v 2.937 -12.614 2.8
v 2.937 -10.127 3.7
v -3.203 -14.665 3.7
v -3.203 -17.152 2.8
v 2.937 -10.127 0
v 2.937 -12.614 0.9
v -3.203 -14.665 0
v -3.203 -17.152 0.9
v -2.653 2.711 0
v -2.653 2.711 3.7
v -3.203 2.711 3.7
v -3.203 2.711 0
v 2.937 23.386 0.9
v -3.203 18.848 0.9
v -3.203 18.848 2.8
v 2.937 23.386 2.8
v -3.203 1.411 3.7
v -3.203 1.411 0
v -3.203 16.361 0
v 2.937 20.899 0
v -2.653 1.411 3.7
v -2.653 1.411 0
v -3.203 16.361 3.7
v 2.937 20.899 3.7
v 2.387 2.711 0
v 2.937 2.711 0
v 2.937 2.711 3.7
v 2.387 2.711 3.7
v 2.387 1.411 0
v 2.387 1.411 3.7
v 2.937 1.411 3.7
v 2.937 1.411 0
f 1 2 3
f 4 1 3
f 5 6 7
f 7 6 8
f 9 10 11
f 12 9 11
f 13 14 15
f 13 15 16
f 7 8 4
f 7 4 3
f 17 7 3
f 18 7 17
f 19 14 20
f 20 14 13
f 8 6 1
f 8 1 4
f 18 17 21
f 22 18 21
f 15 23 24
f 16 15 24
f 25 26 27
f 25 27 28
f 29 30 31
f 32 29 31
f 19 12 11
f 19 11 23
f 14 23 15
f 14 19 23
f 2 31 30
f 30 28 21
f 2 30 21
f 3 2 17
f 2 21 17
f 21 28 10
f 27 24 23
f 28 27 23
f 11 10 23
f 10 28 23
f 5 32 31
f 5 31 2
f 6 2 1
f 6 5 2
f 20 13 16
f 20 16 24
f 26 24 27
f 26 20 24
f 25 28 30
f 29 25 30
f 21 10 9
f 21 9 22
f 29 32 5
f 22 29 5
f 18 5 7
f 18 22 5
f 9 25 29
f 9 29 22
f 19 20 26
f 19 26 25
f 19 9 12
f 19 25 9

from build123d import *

# Parameters (mm, degrees)
BOSS_EXTRUDE1_DEPTH     = 3.7
CHAMFER1_SIZE           = 0.9
CHAMFER1_SIZE2          = 2
CHAMFER2_SIZE           = 2
CHAMFER2_SIZE2          = 0.9
CHAMFER4_SIZE           = 0.9
CHAMFER4_SIZE2          = 2
CHAMFER5_SIZE           = 2
CHAMFER5_SIZE2          = 0.9
CUT_EXTRUDE2_DEPTH      = 1
CUT_EXTRUDE2_DEPTH_BACK = 4.7
CUT_EXTRUDE4_DEPTH      = 1
CUT_EXTRUDE4_DEPTH_BACK = 4.7


with BuildPart() as part:
    # Sketch1 → Boss-Extrude1 (new body)
    with BuildSketch(Plane.XY):
        Polygon((2.936521739, 23.386304348), (2.936521739, -12.613695652), (-3.203478261, -17.151956522), (-3.203478261, 18.848043478), align=None)
    extrude(amount=BOSS_EXTRUDE1_DEPTH)

    # Chamfer1
    chamfer1_edges = [part.edges().sort_by_distance(p)[0] for p in [
        (-0.133478261, 21.117173913, 3.7),
    ]]
    chamfer1_side = [part.faces().sort_by_distance(p)[0] for p in [
        (-0.133478261, 21.117173913, 1.85),
    ]]
    chamfer(chamfer1_edges, length=CHAMFER1_SIZE, length2=CHAMFER1_SIZE2, reference=chamfer1_side[0])

    # Chamfer2
    chamfer2_edges = [part.edges().sort_by_distance(p)[0] for p in [
        (-0.133478261, 21.117173913, 0),
    ]]
    chamfer2_side = [part.faces().sort_by_distance(p)[0] for p in [
        (-0.133478261, 3.117173913, 0),
    ]]
    chamfer(chamfer2_edges, length=CHAMFER2_SIZE, length2=CHAMFER2_SIZE2, reference=chamfer2_side[0])

    # Chamfer4
    chamfer4_edges = [part.edges().sort_by_distance(p)[0] for p in [
        (-0.133478261, -14.882826087, 3.7),
    ]]
    chamfer4_side = [part.faces().sort_by_distance(p)[0] for p in [
        (-0.133478261, -14.882826087, 1.85),
    ]]
    chamfer(chamfer4_edges, length=CHAMFER4_SIZE, length2=CHAMFER4_SIZE2, reference=chamfer4_side[0])

    # Chamfer5
    chamfer5_edges = [part.edges().sort_by_distance(p)[0] for p in [
        (-0.133478261, -14.882826087, 0),
    ]]
    chamfer5_side = [part.faces().sort_by_distance(p)[0] for p in [
        (-0.133478261, 1.873665248, 0),
    ]]
    chamfer(chamfer5_edges, length=CHAMFER5_SIZE, length2=CHAMFER5_SIZE2, reference=chamfer5_side[0])

    # Sketch2 → Cut-Extrude2 (cut, two sides)
    with BuildSketch(Plane.XY.offset(3.7)) as cut_extrude2_sk:
        Polygon((-58.837345155, 2.711026149), (-3.203478261, 2.711026149), (-2.653478261, 2.711026149), (-2.653478261, 1.411026149), (-3.203478261, 1.411026149), (-58.837345155, 1.411026149), (-170.105078945, 1.411026149), (-170.105078945, 2.711026149), align=None)
    extrude(amount=CUT_EXTRUDE2_DEPTH, mode=Mode.SUBTRACT)
    extrude(cut_extrude2_sk.sketch, amount=-CUT_EXTRUDE2_DEPTH_BACK, mode=Mode.SUBTRACT)

    # Sketch3 → Cut-Extrude4 (cut, two sides)
    with BuildSketch(Plane.XY.offset(3.7)) as cut_extrude4_sk:
        Polygon((58.570388634, 2.711026149), (2.936521739, 2.711026149), (2.386521739, 2.711026149), (2.386521739, 1.411026149), (2.936521739, 1.411026149), (58.570388634, 1.411026149), (169.838122423, 1.411026149), (169.838122423, 2.711026149), align=None)
    extrude(amount=CUT_EXTRUDE4_DEPTH, mode=Mode.SUBTRACT)
    extrude(cut_extrude4_sk.sketch, amount=-CUT_EXTRUDE4_DEPTH_BACK, mode=Mode.SUBTRACT)


solid = part.part
